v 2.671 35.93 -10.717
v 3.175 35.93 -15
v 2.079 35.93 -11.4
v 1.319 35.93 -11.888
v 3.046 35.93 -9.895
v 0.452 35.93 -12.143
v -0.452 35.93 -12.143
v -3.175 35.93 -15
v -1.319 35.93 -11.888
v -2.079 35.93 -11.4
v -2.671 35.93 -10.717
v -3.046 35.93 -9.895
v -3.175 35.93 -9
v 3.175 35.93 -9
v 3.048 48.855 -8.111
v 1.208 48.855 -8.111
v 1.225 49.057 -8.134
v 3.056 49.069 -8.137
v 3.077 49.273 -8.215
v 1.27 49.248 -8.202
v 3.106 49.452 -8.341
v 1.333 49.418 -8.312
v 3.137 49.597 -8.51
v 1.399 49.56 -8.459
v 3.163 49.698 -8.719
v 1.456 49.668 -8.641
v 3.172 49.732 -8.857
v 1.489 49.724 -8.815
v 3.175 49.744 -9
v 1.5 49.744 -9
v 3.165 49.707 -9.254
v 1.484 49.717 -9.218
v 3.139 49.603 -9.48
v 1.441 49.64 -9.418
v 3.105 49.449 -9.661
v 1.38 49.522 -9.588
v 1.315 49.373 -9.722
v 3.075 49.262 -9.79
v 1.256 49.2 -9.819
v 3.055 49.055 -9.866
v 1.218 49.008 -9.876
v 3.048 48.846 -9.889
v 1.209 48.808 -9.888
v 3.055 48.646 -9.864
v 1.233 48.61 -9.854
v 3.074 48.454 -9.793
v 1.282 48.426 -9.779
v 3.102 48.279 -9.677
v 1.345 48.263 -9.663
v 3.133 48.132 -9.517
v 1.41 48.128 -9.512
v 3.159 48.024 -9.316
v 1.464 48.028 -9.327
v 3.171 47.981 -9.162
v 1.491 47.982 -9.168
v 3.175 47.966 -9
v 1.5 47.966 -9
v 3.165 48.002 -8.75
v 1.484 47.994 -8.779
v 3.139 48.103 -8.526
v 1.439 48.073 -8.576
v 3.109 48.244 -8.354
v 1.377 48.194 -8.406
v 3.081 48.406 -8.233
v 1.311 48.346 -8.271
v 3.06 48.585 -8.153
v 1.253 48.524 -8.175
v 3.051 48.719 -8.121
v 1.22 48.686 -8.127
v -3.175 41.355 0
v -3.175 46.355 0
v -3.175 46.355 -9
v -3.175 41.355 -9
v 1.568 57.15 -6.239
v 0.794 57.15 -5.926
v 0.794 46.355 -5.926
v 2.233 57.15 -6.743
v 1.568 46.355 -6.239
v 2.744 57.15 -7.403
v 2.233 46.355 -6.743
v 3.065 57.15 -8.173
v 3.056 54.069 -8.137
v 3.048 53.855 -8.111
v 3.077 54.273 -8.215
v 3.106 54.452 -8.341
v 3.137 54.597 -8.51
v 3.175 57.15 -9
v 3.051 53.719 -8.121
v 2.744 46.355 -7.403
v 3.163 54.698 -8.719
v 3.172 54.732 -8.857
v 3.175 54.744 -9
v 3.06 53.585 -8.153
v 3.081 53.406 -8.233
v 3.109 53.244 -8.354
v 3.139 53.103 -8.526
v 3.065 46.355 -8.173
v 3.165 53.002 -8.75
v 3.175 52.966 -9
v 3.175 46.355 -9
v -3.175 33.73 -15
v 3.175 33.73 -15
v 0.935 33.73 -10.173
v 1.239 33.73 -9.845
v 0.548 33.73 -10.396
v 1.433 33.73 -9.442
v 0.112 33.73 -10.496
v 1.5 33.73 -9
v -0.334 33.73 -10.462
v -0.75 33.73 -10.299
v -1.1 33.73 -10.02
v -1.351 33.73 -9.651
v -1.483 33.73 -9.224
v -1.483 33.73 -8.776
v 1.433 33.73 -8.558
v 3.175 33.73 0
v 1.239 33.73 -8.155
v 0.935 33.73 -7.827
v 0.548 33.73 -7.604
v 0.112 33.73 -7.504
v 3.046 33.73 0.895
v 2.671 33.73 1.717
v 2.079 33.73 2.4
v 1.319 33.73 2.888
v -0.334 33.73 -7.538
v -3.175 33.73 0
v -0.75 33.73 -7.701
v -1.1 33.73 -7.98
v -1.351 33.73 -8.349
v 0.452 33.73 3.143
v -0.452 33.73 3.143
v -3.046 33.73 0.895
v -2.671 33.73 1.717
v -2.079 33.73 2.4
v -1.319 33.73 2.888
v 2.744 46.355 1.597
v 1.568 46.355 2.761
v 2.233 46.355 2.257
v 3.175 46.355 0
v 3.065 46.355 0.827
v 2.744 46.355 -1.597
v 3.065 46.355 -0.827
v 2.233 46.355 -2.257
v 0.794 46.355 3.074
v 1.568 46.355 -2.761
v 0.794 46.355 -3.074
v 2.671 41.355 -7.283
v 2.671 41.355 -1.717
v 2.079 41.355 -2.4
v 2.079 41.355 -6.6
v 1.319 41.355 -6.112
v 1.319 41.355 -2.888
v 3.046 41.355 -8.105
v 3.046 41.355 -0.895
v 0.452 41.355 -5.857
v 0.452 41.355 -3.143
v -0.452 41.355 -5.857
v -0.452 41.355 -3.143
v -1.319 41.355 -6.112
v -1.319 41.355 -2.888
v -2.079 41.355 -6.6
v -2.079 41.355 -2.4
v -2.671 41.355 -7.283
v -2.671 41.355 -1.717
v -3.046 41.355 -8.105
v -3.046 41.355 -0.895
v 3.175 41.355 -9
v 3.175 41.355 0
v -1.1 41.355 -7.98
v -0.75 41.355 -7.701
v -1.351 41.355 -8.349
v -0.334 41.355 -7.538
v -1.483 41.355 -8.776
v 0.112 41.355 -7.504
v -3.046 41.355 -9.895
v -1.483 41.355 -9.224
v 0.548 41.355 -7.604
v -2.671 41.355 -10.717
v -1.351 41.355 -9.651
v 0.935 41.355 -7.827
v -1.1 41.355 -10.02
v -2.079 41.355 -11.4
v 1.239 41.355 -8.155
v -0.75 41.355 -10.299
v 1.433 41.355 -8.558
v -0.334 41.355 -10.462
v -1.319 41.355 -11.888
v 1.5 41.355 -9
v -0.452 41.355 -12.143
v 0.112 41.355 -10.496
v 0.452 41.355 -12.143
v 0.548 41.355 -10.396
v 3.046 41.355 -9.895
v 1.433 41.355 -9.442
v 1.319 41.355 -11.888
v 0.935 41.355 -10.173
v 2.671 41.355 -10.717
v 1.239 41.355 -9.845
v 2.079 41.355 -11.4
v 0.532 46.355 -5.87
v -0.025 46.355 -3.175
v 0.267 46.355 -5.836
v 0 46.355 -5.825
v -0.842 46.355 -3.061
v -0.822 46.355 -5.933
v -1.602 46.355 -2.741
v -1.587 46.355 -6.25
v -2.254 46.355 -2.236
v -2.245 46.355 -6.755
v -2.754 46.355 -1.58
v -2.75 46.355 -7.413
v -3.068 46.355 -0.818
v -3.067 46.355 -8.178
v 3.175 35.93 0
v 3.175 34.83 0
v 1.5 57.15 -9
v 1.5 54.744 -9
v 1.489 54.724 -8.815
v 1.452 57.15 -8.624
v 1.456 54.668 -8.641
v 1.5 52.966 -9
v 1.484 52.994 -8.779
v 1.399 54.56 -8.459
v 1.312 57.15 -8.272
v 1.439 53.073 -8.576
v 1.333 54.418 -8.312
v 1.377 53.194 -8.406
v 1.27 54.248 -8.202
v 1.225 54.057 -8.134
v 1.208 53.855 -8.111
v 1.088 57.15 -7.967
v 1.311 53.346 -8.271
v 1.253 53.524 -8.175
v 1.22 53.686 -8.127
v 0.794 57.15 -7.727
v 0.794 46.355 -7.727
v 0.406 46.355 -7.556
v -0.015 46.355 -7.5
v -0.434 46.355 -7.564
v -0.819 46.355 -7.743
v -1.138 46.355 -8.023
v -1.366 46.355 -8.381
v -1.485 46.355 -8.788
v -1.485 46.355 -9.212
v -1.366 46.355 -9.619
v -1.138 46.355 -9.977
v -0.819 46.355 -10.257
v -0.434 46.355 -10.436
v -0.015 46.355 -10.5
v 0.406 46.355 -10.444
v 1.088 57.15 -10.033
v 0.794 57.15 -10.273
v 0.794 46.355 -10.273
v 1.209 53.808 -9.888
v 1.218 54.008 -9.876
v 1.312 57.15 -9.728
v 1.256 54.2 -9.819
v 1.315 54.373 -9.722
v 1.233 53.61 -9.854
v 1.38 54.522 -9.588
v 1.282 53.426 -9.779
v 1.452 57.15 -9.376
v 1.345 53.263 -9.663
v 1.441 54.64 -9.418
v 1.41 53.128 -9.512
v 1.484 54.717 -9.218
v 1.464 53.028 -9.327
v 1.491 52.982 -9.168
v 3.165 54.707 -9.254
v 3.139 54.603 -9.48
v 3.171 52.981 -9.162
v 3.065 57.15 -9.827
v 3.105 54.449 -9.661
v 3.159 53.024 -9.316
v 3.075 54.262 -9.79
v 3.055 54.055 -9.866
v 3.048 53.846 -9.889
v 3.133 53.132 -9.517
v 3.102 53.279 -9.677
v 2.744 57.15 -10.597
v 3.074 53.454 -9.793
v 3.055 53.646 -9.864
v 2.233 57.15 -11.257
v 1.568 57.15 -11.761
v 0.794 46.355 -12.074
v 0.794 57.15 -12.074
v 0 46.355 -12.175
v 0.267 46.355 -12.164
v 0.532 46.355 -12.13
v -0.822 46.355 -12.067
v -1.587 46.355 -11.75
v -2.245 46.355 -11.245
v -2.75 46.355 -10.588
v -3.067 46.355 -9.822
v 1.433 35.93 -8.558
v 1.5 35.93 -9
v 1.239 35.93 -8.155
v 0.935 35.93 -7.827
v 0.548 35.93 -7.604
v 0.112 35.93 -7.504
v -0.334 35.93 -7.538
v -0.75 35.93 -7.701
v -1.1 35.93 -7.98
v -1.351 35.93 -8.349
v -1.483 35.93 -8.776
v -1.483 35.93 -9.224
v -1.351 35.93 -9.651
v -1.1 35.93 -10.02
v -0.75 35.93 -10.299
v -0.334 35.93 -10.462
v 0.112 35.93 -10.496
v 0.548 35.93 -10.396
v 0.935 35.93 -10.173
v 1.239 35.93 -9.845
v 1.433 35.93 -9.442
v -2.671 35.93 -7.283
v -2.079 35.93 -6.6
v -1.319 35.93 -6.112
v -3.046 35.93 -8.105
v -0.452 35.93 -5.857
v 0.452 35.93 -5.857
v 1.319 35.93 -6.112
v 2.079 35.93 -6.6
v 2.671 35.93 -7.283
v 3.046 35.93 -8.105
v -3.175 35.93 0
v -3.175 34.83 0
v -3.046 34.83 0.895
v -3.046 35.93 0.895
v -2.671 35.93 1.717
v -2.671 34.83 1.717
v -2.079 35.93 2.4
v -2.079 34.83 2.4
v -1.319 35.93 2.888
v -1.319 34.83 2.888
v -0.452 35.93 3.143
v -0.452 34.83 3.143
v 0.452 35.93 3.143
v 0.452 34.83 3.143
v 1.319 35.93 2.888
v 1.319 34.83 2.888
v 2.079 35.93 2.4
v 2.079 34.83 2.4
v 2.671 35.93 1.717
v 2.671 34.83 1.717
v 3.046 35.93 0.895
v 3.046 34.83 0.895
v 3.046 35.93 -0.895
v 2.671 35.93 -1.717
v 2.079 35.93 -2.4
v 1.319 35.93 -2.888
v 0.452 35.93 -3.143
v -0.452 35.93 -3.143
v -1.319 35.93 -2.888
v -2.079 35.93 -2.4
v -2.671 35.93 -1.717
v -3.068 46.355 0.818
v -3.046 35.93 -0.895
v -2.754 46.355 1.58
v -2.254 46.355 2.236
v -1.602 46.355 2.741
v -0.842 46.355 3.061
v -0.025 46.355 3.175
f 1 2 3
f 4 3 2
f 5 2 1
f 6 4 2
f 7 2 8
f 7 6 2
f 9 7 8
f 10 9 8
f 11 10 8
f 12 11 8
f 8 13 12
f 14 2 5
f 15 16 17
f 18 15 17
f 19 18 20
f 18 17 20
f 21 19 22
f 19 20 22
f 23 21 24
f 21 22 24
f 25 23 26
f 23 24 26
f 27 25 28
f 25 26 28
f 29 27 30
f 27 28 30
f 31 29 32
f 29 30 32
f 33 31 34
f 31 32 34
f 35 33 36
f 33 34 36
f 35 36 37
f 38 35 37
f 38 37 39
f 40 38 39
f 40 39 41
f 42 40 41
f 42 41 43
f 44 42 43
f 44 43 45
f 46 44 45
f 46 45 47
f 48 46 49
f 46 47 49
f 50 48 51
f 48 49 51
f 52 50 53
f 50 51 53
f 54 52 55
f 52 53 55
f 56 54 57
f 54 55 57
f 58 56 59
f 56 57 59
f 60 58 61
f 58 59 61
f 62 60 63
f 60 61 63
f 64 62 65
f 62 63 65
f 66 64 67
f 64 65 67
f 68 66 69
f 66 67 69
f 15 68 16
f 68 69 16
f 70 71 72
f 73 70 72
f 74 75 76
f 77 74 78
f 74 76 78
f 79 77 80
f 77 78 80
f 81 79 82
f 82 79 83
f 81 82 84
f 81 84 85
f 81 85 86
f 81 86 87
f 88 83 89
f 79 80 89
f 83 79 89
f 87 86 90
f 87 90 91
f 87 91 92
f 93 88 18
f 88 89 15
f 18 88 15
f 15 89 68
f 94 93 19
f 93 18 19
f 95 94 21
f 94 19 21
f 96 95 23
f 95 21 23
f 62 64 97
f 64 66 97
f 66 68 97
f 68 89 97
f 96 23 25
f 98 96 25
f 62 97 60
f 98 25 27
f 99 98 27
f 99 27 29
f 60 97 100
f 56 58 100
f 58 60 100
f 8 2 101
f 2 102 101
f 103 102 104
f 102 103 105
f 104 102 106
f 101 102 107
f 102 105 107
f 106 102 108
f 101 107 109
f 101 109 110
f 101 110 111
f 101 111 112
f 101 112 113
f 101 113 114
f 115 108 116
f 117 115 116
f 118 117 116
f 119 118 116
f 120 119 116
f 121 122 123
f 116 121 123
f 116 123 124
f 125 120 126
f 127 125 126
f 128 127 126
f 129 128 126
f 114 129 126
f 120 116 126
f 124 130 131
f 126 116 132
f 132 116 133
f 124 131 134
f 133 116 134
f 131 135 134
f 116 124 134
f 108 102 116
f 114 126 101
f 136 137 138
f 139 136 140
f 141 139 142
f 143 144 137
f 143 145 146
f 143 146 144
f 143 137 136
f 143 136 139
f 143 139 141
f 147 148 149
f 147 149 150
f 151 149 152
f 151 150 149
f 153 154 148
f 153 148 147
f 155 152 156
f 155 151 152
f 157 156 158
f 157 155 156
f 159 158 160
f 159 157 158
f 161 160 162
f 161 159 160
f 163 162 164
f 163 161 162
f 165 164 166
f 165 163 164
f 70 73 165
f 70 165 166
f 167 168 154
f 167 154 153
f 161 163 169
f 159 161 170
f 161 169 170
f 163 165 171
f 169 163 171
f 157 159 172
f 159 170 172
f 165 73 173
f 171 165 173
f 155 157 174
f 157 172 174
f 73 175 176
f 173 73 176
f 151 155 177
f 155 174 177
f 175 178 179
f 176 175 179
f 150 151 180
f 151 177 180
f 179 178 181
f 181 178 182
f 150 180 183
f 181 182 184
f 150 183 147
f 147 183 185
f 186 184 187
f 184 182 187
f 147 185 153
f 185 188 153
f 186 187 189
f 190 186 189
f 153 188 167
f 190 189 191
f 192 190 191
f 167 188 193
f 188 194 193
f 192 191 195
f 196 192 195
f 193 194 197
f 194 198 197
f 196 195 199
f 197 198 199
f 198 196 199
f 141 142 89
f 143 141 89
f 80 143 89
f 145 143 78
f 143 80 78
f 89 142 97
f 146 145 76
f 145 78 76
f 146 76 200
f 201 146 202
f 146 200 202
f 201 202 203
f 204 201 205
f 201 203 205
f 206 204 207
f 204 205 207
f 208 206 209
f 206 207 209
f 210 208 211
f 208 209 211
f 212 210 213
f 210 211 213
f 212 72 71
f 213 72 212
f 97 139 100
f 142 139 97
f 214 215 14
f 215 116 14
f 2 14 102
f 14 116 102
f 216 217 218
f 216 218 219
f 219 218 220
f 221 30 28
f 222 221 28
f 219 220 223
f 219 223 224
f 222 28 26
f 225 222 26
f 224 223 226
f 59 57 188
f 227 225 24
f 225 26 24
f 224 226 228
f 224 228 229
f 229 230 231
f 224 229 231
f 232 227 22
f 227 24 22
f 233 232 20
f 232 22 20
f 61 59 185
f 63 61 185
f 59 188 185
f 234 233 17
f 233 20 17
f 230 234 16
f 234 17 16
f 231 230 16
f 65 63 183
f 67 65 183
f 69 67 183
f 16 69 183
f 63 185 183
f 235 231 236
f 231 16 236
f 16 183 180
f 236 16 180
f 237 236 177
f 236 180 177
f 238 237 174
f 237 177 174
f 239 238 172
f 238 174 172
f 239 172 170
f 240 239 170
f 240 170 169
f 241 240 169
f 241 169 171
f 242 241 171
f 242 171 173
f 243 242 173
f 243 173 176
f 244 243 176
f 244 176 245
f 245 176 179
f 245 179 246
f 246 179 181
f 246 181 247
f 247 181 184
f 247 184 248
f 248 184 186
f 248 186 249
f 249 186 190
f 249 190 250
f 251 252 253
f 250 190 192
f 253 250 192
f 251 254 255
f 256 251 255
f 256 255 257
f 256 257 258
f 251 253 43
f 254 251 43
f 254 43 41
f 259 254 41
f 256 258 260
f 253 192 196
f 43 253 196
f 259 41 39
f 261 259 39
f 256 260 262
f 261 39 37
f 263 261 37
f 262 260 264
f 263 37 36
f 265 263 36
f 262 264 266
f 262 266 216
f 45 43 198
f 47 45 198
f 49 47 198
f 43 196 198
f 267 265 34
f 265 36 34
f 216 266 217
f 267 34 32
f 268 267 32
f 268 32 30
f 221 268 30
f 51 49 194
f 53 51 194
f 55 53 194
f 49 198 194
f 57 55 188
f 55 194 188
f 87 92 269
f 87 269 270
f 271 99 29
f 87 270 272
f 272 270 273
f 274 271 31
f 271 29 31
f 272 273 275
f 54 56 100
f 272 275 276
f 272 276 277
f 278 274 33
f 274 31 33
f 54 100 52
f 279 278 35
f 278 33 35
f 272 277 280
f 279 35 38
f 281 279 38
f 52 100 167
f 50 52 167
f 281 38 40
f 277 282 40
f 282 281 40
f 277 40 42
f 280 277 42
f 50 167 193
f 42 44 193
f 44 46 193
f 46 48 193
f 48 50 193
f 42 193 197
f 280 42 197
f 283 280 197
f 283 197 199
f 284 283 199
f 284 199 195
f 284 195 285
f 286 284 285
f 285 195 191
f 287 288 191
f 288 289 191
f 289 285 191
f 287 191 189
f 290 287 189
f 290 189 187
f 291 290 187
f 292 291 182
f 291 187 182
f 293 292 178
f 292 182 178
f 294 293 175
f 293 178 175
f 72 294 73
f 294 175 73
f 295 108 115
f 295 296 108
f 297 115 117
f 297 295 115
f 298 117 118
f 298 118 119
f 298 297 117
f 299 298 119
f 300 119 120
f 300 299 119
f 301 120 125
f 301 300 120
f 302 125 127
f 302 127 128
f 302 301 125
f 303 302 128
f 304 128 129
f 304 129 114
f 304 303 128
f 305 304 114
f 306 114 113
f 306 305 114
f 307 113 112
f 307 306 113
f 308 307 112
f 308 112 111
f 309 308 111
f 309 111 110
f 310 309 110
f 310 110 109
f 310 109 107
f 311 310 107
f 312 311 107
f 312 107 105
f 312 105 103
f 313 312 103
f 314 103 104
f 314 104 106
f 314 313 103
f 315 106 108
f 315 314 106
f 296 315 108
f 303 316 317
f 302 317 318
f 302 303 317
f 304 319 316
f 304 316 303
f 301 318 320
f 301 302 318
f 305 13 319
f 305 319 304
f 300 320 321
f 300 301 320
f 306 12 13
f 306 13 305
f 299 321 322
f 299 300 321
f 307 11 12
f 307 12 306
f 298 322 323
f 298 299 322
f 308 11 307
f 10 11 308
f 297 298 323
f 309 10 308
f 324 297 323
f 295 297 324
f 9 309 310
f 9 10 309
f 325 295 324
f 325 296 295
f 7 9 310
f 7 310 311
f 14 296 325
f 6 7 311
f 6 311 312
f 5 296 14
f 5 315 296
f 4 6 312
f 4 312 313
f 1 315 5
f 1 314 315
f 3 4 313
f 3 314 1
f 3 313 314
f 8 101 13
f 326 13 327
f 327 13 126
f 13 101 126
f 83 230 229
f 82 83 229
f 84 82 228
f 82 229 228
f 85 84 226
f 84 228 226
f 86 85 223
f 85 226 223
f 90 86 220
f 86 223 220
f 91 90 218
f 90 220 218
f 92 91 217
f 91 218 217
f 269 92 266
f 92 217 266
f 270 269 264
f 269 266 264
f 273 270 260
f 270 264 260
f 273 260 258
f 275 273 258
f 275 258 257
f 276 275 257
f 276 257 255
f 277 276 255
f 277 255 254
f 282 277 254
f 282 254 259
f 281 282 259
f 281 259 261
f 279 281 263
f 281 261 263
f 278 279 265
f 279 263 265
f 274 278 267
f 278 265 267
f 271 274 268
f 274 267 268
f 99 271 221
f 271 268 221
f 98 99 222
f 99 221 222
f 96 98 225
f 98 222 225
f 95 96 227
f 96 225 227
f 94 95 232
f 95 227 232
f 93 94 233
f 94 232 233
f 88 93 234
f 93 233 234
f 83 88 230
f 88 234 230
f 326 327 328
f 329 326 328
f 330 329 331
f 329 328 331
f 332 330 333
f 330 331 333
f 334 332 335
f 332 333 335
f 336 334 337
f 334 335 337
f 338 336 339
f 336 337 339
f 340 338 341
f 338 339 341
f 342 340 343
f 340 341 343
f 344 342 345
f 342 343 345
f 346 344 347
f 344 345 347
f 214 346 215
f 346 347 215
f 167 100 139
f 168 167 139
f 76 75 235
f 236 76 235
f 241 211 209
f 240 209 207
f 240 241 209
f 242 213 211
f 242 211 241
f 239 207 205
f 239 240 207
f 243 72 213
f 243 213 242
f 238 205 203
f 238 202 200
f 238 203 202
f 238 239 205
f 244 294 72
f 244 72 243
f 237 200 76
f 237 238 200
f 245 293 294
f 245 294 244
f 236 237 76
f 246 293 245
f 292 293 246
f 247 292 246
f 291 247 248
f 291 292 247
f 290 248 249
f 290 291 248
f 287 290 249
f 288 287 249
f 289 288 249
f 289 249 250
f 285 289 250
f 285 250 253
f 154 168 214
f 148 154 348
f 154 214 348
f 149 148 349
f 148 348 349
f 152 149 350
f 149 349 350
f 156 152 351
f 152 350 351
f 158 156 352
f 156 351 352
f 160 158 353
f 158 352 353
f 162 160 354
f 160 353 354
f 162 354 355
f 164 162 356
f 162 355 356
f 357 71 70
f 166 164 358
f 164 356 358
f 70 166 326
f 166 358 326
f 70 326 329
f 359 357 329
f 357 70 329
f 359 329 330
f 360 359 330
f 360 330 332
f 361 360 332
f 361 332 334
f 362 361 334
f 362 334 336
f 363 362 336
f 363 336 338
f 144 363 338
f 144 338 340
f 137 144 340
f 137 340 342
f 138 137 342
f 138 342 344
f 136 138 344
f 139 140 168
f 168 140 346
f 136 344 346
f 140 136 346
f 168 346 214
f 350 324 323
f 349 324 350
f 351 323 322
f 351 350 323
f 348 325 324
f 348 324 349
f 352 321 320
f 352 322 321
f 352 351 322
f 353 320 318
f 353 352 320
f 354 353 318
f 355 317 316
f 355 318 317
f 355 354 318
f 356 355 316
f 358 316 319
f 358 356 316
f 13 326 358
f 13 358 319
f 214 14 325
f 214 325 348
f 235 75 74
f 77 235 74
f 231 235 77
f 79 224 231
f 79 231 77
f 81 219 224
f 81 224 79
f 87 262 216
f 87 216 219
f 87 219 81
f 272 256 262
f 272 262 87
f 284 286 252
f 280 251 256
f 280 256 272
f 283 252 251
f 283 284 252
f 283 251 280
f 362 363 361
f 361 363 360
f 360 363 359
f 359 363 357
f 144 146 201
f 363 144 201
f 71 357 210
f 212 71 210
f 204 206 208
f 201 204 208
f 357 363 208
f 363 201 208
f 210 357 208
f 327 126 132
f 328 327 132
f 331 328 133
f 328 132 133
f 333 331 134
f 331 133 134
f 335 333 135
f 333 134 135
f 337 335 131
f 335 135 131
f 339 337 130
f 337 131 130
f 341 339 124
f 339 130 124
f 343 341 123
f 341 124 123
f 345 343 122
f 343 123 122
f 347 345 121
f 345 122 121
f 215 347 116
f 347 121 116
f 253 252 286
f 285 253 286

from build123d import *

# Parameters (mm, degrees)
SKETCH_1_R          = 3.175
EXTRUDE_1_DEPTH     = 57.15
CUT_EXTRUDE_1_DEPTH = 10.795
SKETCH_3_R          = 0.889
CUT_EXTRUDE_2_DEPTH = 10.795
SKETCH_4_R          = 3.175
CUT_EXTRUDE_3_DEPTH = 34.83
SKETCH_5_R          = 1.5
EXTRUDE_2_DEPTH     = 1.1
SKETCH_6_R          = 3.175
EXTRUDE_3_DEPTH     = 21.22
SKETCH_7_R          = 1.5
CUT_EXTRUDE_4_DEPTH = 28
SKETCH_8_W          = 3.969
SKETCH_8_H          = 6.35
CUT_EXTRUDE_5_DEPTH = 10.795
SKETCH_9_R          = 0.889
CUT_EXTRUDE_6_DEPTH = 10.795
EXTRUDE_4_DEPTH     = 5
SKETCH_11_R         = 3.175
CUT_EXTRUDE_7_DEPTH = 5.425
SKETCH_13_R         = 3.175
CUT_EXTRUDE_8_DEPTH = 10.795


with BuildPart() as part:
    # 草图1 → 凸台-拉伸1 (new body)
    with BuildSketch(Plane(origin=(0, 0, 0), x_dir=(1, 0, 0), z_dir=(0, 1, 0))):
        Circle(SKETCH_1_R)
    extrude(amount=EXTRUDE_1_DEPTH)

    # 草图2 → 切除-拉伸1 (cut)
    with BuildSketch(Plane(origin=(0, 57.15, 0), x_dir=(1, 0, 0), z_dir=(0, 1, 0))):
        Polygon((0.794, 3.175), (0.794, -3.175), (-3.175, -3.175), (-3.175, 3.175), (-3.175, 13.175), (0.794, 13.175), align=None)
    extrude(amount=-CUT_EXTRUDE_1_DEPTH, mode=Mode.SUBTRACT)

    # 草图3 → 切除-拉伸2 (cut)
    with BuildSketch(Plane.ZY.offset(-0.794)):
        with Locations((0, 53.855)):
            Circle(SKETCH_3_R)
        with Locations((0, 48.855)):
            Circle(SKETCH_3_R)
    extrude(amount=-CUT_EXTRUDE_2_DEPTH, mode=Mode.SUBTRACT)

    # 草图4 → 切除-拉伸3 (cut)
    with BuildSketch(Plane.XZ):
        Circle(SKETCH_4_R)
    extrude(amount=-CUT_EXTRUDE_3_DEPTH, mode=Mode.SUBTRACT)

    # 草图5 → 凸台-拉伸2 (add, symmetric)
    with BuildSketch(Plane.XZ.offset(-34.83)):
        with BuildLine():
            Line((3.175, 0), (3.175, -15))
            Line((3.175, -15), (-3.175, -15))
            Line((-3.175, -15), (-3.175, 0))
            ThreePointArc((-3.175, 0), (0, 3.175), (3.175, 0))
        make_face()
        with Locations((0, -9)):
            Circle(SKETCH_5_R, mode=Mode.SUBTRACT)
    extrude(amount=EXTRUDE_2_DEPTH, both=True)

    # 草图6 → 凸台-拉伸3 (add)
    with BuildSketch(Plane(origin=(0, 35.93, 0), x_dir=(1, 0, 0), z_dir=(0, 1, 0))):
        with Locations((0, 9)):
            Circle(SKETCH_6_R)
    extrude(amount=EXTRUDE_3_DEPTH)

    # 草图7 → 切除-拉伸4 (cut)
    with BuildSketch(Plane.XZ.offset(-33.73)):
        with Locations((0, -9)):
            Circle(SKETCH_7_R)
    extrude(amount=-CUT_EXTRUDE_4_DEPTH, mode=Mode.SUBTRACT)

    # 草图8 → 切除-拉伸5 (cut)
    with BuildSketch(Plane(origin=(0, 57.15, 0), x_dir=(1, 0, 0), z_dir=(0, 1, 0))):
        with Locations((-1.1905, 9)):
            Rectangle(SKETCH_8_W, SKETCH_8_H)
    extrude(amount=-CUT_EXTRUDE_5_DEPTH, mode=Mode.SUBTRACT)

    # 草图9 → 切除-拉伸6 (cut)
    with BuildSketch(Plane.ZY.offset(-0.794)):
        with Locations((-9, 48.855)):
            Circle(SKETCH_9_R)
        with Locations((-9, 53.855)):
            Circle(SKETCH_9_R)
    extrude(amount=-CUT_EXTRUDE_6_DEPTH, mode=Mode.SUBTRACT)

    # 草图10 → 凸台-拉伸4 (add)
    with BuildSketch(Plane(origin=(0, 46.355, 0), x_dir=(1, 0, 0), z_dir=(0, 1, 0))):
        with BuildLine():
            Line((-3.175, 0), (-3.175, 9))
            ThreePointArc((-3.175, 9), (0, 5.825), (3.175, 9))
            Line((3.175, 9), (3.175, 0))
            ThreePointArc((3.175, 0), (0, 3.175), (-3.175, 0))
        make_face()
    extrude(amount=-EXTRUDE_4_DEPTH)

    # 草图11 → 切除-拉伸7 (cut)
    with BuildSketch(Plane(origin=(0, 35.93, 0), x_dir=(1, 0, 0), z_dir=(0, 1, 0))):
        with Locations((0, 9)):
            Circle(SKETCH_11_R)
    extrude(amount=CUT_EXTRUDE_7_DEPTH, mode=Mode.SUBTRACT)

    # 草图13 → 切除-拉伸8 (cut)
    with BuildSketch(Plane(origin=(0, 46.355, 0), x_dir=(1, 0, 0), z_dir=(0, 1, 0))):
        Circle(SKETCH_13_R)
    extrude(amount=CUT_EXTRUDE_8_DEPTH, mode=Mode.SUBTRACT)


solid = part.part
